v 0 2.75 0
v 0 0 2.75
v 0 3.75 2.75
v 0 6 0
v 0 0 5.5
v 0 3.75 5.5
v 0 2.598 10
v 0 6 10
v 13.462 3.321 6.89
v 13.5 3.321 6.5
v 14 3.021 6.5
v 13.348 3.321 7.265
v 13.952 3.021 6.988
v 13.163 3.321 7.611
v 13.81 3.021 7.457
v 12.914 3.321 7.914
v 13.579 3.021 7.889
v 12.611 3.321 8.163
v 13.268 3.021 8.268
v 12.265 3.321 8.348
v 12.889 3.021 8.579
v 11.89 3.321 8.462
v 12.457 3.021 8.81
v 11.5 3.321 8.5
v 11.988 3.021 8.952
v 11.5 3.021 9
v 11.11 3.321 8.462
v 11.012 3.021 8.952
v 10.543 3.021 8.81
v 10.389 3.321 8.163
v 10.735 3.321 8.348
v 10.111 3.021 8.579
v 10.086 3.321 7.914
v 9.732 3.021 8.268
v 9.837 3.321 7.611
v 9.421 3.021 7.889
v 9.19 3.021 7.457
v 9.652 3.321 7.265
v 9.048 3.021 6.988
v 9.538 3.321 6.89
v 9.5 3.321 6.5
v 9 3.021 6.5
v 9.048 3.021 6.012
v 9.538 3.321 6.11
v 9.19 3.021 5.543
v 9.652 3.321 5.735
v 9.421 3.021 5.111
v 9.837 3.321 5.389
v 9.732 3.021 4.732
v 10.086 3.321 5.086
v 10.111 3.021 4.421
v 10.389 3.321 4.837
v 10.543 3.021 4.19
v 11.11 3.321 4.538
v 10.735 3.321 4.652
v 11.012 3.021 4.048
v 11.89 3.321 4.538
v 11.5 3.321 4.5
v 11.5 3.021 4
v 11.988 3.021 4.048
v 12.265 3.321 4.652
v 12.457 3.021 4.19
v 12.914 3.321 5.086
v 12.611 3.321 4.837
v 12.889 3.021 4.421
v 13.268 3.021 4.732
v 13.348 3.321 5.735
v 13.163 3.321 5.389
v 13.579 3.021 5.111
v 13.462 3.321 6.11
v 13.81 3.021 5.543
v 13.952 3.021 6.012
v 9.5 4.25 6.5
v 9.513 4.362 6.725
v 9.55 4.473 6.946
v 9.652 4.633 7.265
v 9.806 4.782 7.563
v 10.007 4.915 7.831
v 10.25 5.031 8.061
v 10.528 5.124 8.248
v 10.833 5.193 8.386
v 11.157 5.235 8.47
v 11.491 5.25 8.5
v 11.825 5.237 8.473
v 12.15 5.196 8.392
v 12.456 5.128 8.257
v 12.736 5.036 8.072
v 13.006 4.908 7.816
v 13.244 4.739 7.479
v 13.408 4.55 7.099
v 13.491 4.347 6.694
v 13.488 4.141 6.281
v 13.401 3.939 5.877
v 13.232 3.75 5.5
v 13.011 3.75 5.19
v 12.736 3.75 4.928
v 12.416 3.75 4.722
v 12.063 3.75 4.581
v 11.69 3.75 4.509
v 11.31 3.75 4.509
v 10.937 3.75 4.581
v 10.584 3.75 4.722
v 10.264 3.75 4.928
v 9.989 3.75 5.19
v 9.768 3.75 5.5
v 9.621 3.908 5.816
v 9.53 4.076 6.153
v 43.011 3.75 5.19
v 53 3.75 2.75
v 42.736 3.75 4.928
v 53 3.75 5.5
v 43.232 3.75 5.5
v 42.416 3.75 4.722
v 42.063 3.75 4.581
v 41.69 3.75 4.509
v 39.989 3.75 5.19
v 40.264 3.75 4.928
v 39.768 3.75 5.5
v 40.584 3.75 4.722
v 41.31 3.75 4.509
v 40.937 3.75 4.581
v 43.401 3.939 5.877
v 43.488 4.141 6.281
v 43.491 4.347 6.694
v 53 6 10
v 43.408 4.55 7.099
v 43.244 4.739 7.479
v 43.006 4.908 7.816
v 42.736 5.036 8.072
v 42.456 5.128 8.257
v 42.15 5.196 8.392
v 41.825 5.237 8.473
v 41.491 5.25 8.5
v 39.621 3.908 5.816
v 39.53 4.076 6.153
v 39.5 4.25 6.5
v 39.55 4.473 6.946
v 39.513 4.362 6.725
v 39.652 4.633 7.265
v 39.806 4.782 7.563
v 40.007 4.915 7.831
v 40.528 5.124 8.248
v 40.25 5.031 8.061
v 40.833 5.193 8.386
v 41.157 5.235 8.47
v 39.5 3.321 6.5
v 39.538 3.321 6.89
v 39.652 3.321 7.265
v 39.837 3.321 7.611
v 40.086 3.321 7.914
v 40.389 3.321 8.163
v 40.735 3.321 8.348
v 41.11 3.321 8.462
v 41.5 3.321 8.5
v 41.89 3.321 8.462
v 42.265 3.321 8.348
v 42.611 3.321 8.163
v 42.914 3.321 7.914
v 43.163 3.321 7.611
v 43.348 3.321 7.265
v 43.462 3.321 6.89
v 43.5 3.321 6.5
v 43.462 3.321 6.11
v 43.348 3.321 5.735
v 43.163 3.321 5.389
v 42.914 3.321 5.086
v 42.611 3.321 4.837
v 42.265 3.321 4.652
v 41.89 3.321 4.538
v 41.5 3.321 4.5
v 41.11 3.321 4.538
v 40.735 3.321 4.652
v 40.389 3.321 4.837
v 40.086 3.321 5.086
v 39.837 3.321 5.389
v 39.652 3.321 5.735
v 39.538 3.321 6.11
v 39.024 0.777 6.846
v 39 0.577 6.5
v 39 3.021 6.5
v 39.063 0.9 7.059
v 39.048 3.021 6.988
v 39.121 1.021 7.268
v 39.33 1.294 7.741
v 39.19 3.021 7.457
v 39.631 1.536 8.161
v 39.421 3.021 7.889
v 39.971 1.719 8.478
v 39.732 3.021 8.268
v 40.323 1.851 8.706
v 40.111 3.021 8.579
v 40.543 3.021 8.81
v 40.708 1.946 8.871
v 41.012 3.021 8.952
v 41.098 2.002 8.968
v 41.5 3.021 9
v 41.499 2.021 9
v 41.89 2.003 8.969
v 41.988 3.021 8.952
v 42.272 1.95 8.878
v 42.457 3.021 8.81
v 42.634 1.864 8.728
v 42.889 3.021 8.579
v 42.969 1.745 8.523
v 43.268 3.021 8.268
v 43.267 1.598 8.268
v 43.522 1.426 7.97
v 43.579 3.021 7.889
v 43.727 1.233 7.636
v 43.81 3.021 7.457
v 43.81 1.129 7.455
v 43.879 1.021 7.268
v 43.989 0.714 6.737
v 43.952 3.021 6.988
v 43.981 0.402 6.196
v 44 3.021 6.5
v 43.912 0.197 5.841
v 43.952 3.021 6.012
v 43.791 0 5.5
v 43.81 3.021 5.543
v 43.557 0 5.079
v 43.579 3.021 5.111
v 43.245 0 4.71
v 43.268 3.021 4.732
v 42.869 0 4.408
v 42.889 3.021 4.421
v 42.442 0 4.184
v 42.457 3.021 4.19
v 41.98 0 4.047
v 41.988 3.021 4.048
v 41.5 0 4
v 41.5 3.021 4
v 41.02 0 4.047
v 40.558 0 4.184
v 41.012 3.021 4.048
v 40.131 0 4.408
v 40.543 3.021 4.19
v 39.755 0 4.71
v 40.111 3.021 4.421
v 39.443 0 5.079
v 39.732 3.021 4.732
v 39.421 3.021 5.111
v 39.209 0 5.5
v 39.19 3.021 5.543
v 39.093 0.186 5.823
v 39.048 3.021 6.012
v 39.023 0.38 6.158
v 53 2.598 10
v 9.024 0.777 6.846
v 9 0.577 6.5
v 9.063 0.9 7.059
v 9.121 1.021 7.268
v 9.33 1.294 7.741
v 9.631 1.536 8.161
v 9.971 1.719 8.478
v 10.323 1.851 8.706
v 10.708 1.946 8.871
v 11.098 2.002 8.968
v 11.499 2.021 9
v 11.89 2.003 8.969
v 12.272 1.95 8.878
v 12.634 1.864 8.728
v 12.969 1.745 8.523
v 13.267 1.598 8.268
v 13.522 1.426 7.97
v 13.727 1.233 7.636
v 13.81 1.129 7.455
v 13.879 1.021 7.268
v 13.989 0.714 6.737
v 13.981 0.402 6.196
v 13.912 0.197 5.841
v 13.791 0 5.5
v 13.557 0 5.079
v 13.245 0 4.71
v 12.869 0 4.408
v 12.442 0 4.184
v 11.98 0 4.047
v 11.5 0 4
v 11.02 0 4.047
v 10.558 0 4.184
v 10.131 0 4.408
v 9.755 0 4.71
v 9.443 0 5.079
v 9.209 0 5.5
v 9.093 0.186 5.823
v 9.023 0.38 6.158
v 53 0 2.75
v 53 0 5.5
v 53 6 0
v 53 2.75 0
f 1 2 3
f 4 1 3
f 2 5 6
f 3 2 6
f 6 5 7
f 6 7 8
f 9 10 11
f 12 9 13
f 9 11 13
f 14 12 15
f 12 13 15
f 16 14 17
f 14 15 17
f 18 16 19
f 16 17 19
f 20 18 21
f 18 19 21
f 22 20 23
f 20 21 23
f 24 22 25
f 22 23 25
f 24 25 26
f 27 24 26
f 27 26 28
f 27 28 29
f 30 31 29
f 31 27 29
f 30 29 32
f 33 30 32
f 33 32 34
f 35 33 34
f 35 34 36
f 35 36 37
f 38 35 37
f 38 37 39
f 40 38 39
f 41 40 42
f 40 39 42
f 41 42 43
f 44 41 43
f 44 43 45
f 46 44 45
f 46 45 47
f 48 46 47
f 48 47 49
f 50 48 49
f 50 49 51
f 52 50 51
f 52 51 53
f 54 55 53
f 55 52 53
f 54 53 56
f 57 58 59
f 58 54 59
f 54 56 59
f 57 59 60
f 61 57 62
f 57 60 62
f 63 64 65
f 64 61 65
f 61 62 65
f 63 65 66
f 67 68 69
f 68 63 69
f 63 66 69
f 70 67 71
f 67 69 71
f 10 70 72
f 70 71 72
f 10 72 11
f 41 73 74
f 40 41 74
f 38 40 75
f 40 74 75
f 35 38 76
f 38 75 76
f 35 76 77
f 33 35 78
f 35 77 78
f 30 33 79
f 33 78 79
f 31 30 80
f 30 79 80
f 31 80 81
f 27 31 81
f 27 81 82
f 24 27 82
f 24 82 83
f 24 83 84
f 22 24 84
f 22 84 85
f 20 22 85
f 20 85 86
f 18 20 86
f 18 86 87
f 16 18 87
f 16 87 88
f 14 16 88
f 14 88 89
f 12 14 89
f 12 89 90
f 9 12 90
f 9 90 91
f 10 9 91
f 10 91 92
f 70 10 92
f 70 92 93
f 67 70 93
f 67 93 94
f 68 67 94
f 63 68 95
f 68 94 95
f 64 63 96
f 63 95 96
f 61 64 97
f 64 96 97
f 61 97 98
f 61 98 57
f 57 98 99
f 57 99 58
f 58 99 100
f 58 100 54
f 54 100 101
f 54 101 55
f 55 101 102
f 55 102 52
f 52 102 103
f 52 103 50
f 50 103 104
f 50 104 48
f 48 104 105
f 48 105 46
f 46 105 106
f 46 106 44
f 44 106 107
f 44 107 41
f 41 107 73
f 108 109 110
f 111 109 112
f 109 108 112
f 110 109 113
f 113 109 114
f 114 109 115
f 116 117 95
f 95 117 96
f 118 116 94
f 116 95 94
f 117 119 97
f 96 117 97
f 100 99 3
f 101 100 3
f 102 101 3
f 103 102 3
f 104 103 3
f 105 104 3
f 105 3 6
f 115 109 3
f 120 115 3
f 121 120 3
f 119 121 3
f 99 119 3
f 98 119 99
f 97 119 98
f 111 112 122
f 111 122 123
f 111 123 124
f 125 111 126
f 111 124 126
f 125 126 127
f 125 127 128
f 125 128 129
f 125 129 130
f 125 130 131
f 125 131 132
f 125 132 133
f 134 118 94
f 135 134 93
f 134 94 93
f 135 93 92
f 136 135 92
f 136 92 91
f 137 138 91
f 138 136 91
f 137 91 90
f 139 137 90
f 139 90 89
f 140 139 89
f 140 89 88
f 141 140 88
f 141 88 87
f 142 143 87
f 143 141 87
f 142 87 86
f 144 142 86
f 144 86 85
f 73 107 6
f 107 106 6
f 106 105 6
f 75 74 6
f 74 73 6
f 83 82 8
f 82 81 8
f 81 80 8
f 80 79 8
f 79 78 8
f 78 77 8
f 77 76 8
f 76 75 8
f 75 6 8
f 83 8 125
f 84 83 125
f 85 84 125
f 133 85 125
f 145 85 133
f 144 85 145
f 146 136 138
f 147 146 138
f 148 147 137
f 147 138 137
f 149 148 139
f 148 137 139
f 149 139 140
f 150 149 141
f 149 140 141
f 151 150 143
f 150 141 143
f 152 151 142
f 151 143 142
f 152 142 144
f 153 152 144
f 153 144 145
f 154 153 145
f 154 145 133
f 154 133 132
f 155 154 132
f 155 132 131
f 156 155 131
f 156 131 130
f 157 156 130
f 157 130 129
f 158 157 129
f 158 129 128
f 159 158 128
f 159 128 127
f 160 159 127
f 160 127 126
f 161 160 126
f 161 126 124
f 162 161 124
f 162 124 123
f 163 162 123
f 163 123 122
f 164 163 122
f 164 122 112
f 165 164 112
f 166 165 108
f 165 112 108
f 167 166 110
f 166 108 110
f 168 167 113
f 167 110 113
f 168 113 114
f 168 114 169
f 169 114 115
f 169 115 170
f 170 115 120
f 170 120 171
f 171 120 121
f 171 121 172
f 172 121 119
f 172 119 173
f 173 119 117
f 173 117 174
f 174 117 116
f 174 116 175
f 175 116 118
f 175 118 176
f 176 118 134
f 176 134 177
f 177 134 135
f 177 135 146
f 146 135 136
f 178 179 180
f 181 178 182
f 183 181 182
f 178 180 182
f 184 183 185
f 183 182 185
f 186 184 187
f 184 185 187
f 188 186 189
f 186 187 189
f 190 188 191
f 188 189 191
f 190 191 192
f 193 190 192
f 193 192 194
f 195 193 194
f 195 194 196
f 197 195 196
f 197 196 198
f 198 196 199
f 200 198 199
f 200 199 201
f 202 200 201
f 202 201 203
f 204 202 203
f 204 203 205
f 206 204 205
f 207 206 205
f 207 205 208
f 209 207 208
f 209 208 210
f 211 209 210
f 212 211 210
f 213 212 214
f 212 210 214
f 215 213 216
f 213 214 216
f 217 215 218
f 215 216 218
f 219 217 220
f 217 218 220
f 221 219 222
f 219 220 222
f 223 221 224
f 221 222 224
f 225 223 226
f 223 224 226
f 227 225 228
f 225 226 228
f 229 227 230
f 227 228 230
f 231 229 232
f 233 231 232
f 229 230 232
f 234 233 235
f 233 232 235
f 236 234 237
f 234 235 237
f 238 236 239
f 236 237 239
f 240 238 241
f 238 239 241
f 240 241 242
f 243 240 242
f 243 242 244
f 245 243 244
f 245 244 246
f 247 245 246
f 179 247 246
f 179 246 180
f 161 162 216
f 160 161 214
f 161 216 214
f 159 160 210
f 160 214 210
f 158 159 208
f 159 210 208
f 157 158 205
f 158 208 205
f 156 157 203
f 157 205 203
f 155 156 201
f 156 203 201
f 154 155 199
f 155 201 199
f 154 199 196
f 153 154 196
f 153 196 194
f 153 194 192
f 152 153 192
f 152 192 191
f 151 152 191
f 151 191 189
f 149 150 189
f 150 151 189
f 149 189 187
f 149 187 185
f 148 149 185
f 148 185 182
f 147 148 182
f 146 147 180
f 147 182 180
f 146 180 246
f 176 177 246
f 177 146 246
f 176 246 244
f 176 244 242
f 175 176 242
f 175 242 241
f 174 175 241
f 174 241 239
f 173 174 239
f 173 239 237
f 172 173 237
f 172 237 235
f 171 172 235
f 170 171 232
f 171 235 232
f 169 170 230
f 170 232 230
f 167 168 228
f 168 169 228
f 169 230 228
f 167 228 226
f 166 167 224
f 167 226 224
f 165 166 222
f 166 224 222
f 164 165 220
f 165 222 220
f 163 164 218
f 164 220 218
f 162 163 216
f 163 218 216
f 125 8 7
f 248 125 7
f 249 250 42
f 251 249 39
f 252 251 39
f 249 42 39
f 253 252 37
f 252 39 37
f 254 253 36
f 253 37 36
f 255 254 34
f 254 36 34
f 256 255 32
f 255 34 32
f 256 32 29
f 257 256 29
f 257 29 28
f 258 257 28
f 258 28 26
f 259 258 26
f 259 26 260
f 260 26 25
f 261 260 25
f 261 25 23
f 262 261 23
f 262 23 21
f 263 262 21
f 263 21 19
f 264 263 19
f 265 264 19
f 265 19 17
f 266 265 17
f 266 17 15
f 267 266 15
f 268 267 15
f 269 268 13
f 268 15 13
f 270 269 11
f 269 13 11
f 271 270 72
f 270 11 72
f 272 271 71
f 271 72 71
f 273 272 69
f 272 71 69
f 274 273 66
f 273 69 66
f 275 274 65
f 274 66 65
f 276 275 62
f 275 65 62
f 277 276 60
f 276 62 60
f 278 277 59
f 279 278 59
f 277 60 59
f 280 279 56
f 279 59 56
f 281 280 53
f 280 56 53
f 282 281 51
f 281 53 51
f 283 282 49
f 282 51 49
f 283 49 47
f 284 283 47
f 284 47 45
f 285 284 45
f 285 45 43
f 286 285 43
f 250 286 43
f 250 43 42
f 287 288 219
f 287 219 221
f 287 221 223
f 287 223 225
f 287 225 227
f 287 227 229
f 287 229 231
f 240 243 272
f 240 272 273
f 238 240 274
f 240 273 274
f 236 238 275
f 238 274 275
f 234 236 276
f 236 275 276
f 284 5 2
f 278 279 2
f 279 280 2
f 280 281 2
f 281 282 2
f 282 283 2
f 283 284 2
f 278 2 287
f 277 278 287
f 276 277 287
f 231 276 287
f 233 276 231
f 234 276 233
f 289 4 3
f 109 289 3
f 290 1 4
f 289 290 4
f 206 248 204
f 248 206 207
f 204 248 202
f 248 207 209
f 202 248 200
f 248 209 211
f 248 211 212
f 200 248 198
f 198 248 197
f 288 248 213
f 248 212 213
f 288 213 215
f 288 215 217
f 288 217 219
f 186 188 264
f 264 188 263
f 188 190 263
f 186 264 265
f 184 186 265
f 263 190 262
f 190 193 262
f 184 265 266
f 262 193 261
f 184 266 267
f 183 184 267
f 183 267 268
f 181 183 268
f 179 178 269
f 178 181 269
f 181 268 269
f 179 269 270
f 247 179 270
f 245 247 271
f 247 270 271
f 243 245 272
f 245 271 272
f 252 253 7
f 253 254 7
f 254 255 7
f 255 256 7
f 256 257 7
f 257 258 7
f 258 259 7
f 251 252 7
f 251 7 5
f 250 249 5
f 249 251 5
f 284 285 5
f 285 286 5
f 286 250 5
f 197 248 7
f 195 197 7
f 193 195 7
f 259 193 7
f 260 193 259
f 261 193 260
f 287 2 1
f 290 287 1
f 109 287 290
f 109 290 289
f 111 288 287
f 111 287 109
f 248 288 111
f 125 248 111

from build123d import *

# Parameters (mm, degrees)
F1_DEPTH = 53
F3_D     = 4
F3_DEPTH = 7.5
F3_START = 1.7320508
F3_TIP   = 1.2017212381
F4_D     = 4
F4_DEPTH = 7.5
F4_START = 1.7320508
F4_TIP   = 1.2017212381
F5_D     = 5
F5_DEPTH = 1
F5_START = 2.0207259
F5_TIP   = 1.5021515476
F6_D     = 5
F6_DEPTH = 1
F6_START = 2.0207259
F6_TIP   = 1.5021515476


with BuildPart() as f1:
    # F0 (on Right) → F1 (new body)
    with BuildSketch(Plane.YZ):
        Polygon((0, 2.75), (2.75, 0), (6, 0), (3.75, 2.75), (3.75, 5.5), (6, 10), (2.5980762114, 10), (0, 5.5), align=None)
    extrude(amount=F1_DEPTH)

    # F3
    # its depths count from where the whole tool has entered the part; down to there all is cleared
    with Locations(Plane.XZ.offset(-F3_START)):
        with Locations((11.5, 6.5)):
            Hole(F3_D / 2, depth=F3_DEPTH)
            with Locations((0, 0, -(F3_DEPTH + F3_TIP / 2))):  # 118° drill point
                Cone(0, F3_D / 2, F3_TIP, mode=Mode.SUBTRACT)

    # F4
    # its depths count from where the whole tool has entered the part; down to there all is cleared
    with Locations(Plane.XZ.offset(-F4_START)):
        with Locations((41.5, 6.5)):
            Hole(F4_D / 2, depth=F4_DEPTH)
            with Locations((0, 0, -(F4_DEPTH + F4_TIP / 2))):  # 118° drill point
                Cone(0, F4_D / 2, F4_TIP, mode=Mode.SUBTRACT)

    # F5
    # its depths count from where the whole tool has entered the part; down to there all is cleared
    with Locations(Plane.XZ):
        with Locations((11.5, 6.5)):
            Hole(F5_D / 2, depth=F5_START)
    with Locations(Plane.XZ.offset(-F5_START)):
        with Locations((11.5, 6.5)):
            Hole(F5_D / 2, depth=F5_DEPTH)
            with Locations((0, 0, -(F5_DEPTH + F5_TIP / 2))):  # 118° drill point
                Cone(0, F5_D / 2, F5_TIP, mode=Mode.SUBTRACT)

    # F6
    # its depths count from where the whole tool has entered the part; down to there all is cleared
    with Locations(Plane.XZ):
        with Locations((41.5, 6.5)):
            Hole(F6_D / 2, depth=F6_START)
    with Locations(Plane.XZ.offset(-F6_START)):
        with Locations((41.5, 6.5)):
            Hole(F6_D / 2, depth=F6_DEPTH)
            with Locations((0, 0, -(F6_DEPTH + F6_TIP / 2))):  # 118° drill point
                Cone(0, F6_D / 2, F6_TIP, mode=Mode.SUBTRACT)


solid = f1.part
